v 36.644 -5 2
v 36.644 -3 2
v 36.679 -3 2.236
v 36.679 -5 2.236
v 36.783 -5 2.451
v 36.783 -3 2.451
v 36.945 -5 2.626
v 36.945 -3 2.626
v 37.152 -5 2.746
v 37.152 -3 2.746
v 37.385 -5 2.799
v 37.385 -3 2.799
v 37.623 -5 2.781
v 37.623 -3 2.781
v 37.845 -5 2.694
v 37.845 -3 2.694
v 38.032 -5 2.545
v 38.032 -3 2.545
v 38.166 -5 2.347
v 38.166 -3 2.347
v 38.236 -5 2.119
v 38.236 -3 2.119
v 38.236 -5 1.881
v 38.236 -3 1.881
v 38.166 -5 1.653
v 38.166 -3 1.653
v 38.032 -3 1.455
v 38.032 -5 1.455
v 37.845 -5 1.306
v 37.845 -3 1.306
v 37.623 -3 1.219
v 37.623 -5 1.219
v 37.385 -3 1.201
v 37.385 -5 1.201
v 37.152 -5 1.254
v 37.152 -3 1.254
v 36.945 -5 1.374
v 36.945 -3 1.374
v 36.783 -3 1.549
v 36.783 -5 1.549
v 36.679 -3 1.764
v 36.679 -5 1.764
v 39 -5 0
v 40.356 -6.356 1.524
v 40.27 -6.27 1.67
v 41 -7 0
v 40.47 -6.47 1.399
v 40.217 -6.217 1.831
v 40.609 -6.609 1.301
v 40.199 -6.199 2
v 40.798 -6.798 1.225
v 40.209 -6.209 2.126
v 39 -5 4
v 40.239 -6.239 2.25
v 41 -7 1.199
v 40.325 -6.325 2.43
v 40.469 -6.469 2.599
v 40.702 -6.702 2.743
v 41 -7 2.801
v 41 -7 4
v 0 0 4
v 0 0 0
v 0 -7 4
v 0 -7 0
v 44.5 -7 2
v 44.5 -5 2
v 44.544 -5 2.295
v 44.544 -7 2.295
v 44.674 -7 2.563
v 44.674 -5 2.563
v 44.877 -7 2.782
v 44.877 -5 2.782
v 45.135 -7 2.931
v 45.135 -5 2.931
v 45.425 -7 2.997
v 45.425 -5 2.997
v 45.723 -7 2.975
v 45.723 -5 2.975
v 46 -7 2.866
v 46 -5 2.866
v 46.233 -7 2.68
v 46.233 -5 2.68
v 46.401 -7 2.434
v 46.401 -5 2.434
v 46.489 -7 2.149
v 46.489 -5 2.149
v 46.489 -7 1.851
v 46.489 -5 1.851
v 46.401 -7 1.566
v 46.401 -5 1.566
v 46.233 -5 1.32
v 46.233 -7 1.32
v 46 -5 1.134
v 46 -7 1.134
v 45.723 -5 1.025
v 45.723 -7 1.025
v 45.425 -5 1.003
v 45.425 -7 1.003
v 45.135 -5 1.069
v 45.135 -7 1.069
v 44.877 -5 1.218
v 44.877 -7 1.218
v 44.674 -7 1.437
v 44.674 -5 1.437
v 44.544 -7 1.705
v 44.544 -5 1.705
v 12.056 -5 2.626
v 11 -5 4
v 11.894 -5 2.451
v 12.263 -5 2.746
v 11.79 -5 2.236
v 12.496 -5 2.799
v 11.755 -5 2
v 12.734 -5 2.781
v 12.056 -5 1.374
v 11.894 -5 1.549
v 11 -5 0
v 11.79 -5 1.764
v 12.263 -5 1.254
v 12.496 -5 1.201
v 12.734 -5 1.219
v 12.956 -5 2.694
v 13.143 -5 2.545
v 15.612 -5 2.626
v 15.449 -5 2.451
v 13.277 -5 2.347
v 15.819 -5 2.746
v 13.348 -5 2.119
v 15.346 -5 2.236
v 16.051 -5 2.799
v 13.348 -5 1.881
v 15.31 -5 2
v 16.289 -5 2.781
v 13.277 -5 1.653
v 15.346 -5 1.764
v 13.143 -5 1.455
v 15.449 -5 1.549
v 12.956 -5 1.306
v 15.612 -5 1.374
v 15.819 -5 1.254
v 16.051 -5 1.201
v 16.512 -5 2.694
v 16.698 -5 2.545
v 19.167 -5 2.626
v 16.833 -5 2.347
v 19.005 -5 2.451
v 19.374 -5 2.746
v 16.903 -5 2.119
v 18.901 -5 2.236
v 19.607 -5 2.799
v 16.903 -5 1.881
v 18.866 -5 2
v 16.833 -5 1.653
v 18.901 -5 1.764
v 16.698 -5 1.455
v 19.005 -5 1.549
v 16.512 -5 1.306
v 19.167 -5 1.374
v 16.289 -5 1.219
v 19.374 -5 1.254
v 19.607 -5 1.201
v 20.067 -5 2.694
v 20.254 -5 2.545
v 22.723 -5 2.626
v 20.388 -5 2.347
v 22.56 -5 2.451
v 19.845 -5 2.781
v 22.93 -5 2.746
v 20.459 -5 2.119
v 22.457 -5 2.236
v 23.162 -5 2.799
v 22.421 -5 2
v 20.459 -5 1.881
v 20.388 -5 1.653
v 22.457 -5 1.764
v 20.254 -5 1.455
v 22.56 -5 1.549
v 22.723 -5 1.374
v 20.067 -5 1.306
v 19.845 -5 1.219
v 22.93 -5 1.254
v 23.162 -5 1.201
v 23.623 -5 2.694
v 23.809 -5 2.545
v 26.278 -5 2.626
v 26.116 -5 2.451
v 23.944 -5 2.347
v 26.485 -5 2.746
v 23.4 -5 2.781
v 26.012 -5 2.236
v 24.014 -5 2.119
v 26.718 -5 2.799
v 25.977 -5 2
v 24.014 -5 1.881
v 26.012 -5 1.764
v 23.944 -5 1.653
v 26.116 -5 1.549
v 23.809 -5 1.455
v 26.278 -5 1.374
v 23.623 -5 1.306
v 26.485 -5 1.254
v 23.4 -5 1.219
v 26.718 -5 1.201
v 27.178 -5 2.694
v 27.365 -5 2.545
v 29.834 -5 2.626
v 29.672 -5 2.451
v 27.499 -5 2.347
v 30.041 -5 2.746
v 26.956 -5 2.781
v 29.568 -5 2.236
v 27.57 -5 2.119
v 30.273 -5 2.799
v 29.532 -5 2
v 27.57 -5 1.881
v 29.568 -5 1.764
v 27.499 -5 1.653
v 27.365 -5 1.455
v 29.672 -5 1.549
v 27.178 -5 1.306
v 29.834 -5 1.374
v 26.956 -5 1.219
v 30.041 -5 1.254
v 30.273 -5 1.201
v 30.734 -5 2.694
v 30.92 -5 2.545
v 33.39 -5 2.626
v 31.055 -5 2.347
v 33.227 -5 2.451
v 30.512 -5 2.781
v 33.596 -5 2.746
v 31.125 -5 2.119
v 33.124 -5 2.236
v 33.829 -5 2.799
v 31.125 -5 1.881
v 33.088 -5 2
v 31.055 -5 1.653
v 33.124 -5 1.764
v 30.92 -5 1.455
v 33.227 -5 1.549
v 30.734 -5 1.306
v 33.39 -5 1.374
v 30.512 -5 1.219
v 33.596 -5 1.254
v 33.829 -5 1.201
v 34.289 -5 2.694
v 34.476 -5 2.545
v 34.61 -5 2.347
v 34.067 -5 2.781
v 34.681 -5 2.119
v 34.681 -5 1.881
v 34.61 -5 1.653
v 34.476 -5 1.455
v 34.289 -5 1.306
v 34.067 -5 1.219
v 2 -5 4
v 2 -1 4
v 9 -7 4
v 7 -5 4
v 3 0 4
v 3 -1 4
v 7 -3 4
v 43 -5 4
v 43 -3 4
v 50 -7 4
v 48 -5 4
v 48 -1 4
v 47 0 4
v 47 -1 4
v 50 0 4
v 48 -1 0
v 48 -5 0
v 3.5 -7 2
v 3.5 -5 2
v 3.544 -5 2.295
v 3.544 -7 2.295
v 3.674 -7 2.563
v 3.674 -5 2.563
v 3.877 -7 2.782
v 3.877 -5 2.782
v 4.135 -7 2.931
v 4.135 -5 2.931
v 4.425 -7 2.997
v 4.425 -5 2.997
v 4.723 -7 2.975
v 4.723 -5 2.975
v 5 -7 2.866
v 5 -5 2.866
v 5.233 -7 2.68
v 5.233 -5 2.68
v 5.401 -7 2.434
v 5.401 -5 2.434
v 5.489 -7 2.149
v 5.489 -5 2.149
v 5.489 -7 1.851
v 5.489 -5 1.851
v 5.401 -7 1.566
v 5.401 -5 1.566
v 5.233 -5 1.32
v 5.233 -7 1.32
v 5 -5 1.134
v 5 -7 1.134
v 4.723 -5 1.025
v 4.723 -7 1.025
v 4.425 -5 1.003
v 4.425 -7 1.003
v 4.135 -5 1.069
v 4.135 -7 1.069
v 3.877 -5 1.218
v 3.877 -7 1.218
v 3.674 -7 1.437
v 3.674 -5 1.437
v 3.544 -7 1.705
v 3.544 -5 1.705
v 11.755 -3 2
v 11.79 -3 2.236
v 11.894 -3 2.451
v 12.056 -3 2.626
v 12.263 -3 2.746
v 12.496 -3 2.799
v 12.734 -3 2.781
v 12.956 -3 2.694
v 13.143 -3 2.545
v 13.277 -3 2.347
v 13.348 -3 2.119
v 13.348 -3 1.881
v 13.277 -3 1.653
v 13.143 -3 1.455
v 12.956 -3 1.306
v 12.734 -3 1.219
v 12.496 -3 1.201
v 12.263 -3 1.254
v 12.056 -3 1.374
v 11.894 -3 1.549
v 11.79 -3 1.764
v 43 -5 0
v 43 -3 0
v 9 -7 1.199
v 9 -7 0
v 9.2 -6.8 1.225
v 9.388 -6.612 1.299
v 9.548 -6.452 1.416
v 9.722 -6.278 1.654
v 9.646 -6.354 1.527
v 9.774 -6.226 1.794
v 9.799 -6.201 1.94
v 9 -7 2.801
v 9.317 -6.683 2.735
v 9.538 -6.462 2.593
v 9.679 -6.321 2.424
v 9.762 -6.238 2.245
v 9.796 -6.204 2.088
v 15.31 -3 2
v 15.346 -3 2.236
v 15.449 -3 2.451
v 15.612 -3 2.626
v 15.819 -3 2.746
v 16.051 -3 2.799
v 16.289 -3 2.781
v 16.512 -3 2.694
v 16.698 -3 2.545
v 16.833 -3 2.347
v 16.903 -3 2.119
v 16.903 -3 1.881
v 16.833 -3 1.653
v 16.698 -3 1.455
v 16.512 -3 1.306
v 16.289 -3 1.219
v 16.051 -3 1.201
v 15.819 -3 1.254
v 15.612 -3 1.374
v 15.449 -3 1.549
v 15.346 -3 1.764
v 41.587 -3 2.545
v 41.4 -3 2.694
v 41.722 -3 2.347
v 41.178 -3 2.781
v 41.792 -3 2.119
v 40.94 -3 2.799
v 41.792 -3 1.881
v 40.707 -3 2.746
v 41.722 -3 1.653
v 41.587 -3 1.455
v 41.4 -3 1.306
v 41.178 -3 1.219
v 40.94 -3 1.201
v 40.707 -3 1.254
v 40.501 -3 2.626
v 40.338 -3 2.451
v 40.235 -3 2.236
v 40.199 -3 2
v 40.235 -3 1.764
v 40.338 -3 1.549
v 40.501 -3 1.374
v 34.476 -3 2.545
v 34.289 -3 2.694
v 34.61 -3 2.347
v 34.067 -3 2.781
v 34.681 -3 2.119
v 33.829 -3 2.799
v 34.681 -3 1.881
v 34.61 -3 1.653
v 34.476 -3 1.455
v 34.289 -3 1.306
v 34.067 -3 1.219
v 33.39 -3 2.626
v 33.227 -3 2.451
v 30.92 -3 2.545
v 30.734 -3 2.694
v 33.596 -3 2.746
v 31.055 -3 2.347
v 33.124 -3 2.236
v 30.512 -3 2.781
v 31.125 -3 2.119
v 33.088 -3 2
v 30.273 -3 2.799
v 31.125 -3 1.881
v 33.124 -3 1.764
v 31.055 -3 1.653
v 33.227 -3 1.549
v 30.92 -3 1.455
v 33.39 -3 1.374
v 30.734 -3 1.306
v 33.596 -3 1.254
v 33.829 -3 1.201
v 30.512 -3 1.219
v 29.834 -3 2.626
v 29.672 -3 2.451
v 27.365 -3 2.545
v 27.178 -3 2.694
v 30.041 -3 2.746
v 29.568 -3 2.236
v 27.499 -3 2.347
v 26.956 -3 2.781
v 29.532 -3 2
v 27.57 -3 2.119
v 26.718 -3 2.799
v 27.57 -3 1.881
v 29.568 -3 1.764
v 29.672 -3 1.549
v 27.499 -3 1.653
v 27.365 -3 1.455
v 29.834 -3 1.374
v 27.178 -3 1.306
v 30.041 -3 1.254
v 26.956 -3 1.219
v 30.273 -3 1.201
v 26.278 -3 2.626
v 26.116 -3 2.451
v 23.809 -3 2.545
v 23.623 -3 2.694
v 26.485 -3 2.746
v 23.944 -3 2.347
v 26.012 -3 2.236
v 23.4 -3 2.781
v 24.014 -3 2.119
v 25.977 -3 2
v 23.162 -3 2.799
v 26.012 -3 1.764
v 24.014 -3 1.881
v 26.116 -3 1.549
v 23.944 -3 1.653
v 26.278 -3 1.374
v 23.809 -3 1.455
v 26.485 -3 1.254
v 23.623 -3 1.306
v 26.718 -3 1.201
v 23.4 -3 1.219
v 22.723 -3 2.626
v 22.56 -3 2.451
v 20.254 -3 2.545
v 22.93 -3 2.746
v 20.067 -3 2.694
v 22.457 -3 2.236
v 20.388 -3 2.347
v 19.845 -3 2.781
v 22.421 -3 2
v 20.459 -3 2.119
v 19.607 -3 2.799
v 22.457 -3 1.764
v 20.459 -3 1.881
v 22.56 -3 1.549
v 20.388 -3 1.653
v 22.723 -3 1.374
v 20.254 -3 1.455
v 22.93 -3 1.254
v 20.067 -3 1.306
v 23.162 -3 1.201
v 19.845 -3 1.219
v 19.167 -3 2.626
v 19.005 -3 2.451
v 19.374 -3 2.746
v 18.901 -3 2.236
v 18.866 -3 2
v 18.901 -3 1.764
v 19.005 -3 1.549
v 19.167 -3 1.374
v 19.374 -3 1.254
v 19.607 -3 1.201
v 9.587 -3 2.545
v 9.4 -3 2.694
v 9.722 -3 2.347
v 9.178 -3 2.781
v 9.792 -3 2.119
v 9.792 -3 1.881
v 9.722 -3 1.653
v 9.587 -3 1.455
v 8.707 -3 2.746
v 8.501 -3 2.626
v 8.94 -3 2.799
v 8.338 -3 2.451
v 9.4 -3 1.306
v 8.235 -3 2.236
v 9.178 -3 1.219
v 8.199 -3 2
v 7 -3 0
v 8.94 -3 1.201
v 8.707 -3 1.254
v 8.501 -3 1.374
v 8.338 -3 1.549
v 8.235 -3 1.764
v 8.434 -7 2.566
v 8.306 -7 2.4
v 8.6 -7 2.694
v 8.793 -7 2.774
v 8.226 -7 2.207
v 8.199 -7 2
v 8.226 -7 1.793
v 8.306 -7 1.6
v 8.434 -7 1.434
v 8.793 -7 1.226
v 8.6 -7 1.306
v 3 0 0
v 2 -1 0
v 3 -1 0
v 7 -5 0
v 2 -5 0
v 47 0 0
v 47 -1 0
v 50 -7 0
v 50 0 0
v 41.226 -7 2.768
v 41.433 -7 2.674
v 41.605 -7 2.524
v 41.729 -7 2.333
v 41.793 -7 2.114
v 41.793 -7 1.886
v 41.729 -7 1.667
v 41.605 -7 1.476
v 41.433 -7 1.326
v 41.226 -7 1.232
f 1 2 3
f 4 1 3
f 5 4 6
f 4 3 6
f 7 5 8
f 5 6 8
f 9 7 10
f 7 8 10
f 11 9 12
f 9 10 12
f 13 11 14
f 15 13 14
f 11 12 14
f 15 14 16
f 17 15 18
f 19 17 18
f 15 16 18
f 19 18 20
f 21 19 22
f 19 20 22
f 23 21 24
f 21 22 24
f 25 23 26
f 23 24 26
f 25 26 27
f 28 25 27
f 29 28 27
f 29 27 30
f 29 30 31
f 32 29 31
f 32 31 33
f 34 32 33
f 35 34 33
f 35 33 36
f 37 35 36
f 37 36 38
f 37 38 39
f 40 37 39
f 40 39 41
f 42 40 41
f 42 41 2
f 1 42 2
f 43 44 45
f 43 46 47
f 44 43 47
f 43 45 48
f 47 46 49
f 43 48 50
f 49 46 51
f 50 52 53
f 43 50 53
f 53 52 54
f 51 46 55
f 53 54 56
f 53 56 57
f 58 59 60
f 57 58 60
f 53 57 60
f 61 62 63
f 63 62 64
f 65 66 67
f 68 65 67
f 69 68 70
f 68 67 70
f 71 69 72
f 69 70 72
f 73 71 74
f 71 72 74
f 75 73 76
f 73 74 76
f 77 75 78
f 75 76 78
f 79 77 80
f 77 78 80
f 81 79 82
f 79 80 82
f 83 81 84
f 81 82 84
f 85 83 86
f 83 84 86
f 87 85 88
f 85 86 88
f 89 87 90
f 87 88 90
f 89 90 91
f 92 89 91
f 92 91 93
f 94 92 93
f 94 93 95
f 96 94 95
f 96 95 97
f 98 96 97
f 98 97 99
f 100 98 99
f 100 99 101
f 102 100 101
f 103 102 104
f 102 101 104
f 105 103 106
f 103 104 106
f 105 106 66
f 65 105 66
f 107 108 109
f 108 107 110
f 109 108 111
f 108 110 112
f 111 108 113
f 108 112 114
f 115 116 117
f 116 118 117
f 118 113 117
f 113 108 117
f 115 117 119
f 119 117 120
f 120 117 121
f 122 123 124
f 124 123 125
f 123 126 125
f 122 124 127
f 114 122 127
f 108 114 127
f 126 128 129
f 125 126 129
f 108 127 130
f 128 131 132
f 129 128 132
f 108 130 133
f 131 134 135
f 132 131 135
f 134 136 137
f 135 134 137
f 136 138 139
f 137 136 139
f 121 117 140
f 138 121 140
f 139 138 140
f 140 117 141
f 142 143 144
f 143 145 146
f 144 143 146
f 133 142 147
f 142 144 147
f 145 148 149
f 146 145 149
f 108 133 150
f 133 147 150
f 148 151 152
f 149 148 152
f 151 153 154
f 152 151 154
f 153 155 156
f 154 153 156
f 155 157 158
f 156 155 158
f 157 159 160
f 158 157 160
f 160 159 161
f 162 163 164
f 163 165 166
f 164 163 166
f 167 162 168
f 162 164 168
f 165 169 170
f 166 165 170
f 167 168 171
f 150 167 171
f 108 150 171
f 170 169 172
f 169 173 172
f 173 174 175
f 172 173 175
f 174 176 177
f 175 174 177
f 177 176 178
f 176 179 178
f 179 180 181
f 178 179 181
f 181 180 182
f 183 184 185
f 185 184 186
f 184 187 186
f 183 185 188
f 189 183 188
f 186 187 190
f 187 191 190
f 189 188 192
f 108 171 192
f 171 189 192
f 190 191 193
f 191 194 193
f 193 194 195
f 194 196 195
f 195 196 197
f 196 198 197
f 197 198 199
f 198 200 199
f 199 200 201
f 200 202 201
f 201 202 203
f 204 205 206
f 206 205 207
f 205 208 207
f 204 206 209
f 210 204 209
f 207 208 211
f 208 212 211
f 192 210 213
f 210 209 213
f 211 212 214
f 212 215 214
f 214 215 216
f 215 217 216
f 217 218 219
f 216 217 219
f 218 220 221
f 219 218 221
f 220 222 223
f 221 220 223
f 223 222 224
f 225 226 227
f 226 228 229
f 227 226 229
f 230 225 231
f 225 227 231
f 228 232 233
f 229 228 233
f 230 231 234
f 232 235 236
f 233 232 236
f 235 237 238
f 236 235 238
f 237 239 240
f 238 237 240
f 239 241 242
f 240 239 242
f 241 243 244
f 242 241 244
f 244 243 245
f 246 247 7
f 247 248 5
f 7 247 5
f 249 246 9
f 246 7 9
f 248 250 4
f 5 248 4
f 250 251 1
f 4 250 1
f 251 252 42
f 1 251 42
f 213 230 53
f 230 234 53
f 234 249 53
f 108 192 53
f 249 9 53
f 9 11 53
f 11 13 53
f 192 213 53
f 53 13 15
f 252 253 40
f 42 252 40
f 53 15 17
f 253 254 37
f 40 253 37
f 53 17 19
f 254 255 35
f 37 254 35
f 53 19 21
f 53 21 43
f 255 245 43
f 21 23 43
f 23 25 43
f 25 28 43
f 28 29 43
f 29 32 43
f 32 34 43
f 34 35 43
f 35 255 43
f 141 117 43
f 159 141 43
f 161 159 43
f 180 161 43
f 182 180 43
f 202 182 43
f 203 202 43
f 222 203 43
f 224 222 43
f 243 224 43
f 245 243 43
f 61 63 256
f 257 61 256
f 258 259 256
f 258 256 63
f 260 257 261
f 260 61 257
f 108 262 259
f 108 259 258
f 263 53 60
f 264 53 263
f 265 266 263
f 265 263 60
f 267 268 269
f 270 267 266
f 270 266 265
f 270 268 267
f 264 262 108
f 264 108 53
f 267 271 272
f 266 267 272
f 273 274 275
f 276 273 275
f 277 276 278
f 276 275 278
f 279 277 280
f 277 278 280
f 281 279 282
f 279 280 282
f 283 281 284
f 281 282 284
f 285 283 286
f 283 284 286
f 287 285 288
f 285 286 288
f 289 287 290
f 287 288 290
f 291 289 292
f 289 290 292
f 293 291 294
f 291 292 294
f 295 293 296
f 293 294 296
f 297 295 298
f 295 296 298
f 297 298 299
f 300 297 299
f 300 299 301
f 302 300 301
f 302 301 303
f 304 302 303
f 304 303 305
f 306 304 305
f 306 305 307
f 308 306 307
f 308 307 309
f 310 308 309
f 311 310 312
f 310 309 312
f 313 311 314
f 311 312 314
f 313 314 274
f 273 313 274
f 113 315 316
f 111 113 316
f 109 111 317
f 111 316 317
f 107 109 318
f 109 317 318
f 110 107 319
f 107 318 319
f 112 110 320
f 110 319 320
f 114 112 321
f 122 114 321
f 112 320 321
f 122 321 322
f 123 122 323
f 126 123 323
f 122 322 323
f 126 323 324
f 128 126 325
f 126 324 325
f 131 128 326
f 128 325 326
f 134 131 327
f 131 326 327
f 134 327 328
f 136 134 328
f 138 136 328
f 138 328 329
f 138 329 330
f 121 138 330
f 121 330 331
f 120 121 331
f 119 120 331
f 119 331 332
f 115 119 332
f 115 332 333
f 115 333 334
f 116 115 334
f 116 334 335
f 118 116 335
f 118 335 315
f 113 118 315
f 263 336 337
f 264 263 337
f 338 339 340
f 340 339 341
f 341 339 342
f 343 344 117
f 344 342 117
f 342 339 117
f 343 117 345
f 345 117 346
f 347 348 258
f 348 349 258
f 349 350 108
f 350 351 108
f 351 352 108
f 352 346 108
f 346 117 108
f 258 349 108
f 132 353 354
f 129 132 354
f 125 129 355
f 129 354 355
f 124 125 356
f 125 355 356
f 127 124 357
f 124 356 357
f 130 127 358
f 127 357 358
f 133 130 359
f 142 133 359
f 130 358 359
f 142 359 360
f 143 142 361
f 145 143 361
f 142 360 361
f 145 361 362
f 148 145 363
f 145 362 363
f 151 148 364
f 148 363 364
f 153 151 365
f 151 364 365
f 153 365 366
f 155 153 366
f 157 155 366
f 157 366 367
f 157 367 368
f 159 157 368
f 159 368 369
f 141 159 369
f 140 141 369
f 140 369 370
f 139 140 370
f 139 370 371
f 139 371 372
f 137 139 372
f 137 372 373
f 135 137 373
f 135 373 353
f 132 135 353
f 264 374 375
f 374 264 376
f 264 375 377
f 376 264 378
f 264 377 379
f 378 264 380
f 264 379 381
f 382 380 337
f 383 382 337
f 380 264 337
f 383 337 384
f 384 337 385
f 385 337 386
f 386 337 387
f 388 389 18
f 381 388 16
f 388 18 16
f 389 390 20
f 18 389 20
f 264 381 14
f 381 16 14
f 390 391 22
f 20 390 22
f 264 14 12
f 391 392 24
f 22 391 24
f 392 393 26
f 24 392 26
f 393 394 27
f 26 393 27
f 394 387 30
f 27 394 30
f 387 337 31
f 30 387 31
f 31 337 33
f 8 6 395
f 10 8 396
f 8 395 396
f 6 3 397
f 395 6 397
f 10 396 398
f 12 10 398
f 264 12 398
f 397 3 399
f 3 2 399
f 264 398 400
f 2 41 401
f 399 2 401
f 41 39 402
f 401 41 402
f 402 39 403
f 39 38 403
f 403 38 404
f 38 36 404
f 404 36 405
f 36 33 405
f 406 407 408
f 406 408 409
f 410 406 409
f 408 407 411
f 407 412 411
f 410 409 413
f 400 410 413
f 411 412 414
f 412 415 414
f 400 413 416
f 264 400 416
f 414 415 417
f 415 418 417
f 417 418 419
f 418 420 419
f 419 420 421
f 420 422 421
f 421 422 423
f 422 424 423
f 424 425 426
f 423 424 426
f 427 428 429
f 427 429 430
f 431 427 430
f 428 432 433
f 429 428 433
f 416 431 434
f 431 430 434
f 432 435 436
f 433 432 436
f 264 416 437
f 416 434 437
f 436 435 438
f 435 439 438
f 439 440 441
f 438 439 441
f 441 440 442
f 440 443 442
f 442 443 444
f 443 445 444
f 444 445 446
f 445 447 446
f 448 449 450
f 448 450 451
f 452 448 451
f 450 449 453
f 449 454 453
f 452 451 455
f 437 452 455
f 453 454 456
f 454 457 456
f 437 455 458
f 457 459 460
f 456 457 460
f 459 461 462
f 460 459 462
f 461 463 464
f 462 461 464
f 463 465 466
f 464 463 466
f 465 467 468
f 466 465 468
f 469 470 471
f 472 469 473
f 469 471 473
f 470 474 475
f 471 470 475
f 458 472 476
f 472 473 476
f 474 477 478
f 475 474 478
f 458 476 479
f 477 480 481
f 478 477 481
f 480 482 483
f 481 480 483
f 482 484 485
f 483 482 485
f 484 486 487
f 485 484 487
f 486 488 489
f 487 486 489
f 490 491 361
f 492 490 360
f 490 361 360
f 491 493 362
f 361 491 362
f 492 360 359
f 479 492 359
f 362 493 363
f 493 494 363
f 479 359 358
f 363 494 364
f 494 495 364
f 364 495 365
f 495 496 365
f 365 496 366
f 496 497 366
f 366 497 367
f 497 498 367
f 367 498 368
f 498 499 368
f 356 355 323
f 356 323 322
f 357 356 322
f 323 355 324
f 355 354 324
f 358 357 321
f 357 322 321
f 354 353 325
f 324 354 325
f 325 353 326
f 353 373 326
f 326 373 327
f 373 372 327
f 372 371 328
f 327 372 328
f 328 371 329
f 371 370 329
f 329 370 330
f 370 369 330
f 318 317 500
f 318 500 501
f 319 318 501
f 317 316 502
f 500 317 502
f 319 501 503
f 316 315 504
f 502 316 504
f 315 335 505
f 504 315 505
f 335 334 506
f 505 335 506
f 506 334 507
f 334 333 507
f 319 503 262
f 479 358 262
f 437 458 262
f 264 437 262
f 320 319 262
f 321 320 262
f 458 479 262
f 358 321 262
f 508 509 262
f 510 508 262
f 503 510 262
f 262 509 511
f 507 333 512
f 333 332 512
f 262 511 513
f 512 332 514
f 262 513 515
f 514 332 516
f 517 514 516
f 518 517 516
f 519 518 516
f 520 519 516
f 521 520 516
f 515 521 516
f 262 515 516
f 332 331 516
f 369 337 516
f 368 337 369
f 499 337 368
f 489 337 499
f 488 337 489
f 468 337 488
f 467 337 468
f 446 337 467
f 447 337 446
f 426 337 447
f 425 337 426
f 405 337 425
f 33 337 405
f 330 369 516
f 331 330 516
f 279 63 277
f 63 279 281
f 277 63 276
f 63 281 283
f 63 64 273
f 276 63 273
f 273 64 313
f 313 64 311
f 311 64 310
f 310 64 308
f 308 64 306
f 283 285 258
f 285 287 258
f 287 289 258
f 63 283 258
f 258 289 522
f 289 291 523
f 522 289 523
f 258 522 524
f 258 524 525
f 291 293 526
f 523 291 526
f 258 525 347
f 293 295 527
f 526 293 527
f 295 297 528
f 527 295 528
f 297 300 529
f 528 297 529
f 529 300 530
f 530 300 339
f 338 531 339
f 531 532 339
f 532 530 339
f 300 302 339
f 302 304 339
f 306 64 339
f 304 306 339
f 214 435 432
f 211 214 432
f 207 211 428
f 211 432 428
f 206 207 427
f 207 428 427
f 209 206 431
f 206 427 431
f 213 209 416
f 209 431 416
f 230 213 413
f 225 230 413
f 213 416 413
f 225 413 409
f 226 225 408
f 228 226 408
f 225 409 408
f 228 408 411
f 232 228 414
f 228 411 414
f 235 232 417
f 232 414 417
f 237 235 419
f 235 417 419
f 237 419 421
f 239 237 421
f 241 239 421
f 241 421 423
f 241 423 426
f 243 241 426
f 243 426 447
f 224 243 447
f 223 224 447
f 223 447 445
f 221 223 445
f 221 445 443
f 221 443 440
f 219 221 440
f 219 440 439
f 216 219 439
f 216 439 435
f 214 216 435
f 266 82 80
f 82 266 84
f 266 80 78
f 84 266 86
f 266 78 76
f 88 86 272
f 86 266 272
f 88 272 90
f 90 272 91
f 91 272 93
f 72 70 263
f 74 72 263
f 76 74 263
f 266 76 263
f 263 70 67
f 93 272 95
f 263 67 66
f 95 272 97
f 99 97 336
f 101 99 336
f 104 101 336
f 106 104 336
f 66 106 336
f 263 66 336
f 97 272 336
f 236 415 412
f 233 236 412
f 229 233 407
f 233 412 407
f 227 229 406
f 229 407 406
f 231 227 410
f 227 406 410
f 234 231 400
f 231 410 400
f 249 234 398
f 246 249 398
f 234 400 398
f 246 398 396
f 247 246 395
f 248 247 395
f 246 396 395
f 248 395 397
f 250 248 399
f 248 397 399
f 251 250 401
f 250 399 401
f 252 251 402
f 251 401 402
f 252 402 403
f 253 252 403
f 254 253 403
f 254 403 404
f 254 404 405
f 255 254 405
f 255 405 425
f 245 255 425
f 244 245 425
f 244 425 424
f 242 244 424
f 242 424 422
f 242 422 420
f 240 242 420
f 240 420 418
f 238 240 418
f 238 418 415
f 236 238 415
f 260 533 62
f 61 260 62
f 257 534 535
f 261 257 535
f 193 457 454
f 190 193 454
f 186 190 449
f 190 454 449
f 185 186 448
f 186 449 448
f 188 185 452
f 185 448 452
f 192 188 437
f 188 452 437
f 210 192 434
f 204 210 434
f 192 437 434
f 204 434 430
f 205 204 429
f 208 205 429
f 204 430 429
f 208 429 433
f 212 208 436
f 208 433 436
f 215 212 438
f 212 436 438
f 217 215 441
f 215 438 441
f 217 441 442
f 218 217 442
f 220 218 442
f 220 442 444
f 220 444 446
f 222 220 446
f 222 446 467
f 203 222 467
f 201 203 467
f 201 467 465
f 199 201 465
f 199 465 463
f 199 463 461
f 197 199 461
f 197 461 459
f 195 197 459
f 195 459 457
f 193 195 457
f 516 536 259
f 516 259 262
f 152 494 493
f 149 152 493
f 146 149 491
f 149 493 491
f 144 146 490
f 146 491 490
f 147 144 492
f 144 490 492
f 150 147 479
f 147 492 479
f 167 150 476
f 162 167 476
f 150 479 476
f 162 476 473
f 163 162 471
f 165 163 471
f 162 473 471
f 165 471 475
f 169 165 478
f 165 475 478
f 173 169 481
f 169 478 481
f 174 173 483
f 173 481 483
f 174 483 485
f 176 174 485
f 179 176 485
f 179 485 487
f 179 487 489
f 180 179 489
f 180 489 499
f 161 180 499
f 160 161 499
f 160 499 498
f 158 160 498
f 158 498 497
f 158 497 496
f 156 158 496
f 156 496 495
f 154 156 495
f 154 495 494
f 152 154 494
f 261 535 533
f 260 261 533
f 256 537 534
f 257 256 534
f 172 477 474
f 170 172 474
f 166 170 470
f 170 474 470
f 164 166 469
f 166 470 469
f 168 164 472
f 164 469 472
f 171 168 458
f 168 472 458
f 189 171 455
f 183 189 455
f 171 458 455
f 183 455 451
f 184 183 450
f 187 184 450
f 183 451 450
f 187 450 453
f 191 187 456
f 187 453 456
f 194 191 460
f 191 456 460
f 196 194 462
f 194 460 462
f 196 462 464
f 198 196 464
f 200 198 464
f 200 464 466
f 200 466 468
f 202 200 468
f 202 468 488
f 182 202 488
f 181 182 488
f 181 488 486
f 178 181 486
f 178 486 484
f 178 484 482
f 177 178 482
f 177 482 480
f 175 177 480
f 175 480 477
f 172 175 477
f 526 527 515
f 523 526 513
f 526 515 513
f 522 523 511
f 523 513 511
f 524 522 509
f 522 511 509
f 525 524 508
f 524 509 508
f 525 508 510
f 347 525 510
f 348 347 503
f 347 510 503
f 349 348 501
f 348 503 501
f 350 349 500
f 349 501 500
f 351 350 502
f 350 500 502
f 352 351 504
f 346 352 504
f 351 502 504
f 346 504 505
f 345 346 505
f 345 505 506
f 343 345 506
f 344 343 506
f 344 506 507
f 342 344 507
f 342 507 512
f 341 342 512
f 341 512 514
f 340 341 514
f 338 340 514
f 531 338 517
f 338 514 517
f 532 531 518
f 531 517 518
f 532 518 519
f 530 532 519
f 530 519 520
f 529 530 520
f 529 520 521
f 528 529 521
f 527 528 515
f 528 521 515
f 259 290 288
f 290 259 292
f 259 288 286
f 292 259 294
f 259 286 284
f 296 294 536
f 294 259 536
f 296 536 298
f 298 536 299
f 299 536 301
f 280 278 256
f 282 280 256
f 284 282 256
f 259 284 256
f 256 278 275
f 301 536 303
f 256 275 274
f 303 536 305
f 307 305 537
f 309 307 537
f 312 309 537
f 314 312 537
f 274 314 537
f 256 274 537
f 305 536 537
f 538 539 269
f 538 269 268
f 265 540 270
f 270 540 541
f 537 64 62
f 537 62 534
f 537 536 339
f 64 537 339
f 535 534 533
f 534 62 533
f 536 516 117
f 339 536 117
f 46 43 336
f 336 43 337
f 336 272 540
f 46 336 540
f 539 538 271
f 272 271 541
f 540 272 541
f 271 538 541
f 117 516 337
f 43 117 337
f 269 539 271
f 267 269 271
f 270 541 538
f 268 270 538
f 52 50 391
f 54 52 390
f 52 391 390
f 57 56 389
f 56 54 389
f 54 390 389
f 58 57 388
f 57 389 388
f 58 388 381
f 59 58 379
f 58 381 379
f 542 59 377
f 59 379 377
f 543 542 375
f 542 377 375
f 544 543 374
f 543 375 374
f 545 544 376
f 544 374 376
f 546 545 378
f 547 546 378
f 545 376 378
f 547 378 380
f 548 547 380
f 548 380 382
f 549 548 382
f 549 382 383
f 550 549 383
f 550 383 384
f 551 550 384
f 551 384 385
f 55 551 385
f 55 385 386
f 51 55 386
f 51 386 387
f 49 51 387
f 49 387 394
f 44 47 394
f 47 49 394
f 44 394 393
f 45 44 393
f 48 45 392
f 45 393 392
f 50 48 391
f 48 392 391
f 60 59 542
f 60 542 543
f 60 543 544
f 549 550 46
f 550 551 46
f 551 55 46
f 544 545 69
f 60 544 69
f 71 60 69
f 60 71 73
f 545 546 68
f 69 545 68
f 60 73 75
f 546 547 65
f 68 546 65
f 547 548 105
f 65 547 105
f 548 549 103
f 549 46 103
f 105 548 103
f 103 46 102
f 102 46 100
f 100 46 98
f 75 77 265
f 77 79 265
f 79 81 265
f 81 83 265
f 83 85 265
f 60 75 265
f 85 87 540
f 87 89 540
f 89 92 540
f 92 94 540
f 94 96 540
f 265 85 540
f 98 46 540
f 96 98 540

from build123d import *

# Parameters (mm, degrees)
F0_W     = 16
F0_H     = 2
F0_W_2   = 2
F0_W_3   = 1
F0_H_2   = 1
F1_DEPTH = 4
F2_SIZE  = 1.99999
F3_R     = 1
F4_DEPTH = 2
F5_R     = 0.8008995453
F6_DEPTH = 5


# Not quite as in the source:
# - a fillet or chamfer is up to 0.001 mm smaller than in the source, because OpenCascade refuses the exact size


with BuildPart() as f1:
    # F0 (on Top) → F1 (new body)
    with BuildSketch(Plane.XY):
        with Locations((33, -4)):
            Rectangle(F0_W, F0_H)
        with Locations((17, -4)):
            Rectangle(F0_W, F0_H)
        Polygon((48, -5), (43, -5), (43, -7), (50, -7), (50, -5), align=None)
        with Locations((42, -6)):
            Rectangle(F0_W_2, F0_H)
        Polygon((2, -5), (0, -5), (0, -7), (7, -7), (7, -5), align=None)
        Polygon((2, 0), (0, 0), (0, -5), (2, -5), (2, -1), align=None)
        with Locations((47.5, -0.5)):
            Rectangle(F0_W_3, F0_H_2)
        with Locations((8, -4)):
            Rectangle(F0_W_2, F0_H)
        with Locations((8, -6)):
            Rectangle(F0_W_2, F0_H)
        with Locations((2.5, -0.5)):
            Rectangle(F0_W_3, F0_H_2)
        with Locations((42, -4)):
            Rectangle(F0_W_2, F0_H)
        Polygon((48, -1), (48, -5), (50, -5), (50, 0), (48, 0), align=None)
    extrude(amount=F1_DEPTH)

    # F2 (size 2 in the source; OpenCascade refuses exactly that, so slightly less here)
    f2_edges = [f1.edges().sort_by_distance(p)[0] for p in [
        (41, -5, 2),
        (9, -5, 2),
    ]]
    chamfer(f2_edges, length=F2_SIZE)

    # F3 (on face) → F4 (cut)
    with BuildSketch(Plane(origin=(0, -5, 0), x_dir=(-1, 0, 0), z_dir=(0, 1, 0))):
        with Locations((-4.5, 2)):
            Circle(F3_R)
        with Locations((-45.5, 2)):
            Circle(F3_R)
    extrude(amount=-F4_DEPTH, mode=Mode.SUBTRACT)

    # F5 (on face) → F6 (cut)
    with BuildSketch(Plane(origin=(0, -3, 0), x_dir=(-1, 0, 0), z_dir=(0, 1, 0))):
        with Locations((-16.1111111111, 2)):
            Circle(F5_R)
        with Locations((-9, 2)):
            Circle(F5_R)
        with Locations((-12.5555555556, 2)):
            Circle(F5_R)
        with Locations((-19.6666666667, 2)):
            Circle(F5_R)
        with Locations((-23.2222222222, 2)):
            Circle(F5_R)
        with Locations((-26.7777777778, 2)):
            Circle(F5_R)
        with Locations((-30.3333333333, 2)):
            Circle(F5_R)
        with Locations((-33.8888888889, 2)):
            Circle(F5_R)
        with Locations((-37.4444444444, 2)):
            Circle(F5_R)
        with Locations((-41, 2)):
            Circle(F5_R)
    extrude(amount=-F6_DEPTH, mode=Mode.SUBTRACT)


solid = f1.part
